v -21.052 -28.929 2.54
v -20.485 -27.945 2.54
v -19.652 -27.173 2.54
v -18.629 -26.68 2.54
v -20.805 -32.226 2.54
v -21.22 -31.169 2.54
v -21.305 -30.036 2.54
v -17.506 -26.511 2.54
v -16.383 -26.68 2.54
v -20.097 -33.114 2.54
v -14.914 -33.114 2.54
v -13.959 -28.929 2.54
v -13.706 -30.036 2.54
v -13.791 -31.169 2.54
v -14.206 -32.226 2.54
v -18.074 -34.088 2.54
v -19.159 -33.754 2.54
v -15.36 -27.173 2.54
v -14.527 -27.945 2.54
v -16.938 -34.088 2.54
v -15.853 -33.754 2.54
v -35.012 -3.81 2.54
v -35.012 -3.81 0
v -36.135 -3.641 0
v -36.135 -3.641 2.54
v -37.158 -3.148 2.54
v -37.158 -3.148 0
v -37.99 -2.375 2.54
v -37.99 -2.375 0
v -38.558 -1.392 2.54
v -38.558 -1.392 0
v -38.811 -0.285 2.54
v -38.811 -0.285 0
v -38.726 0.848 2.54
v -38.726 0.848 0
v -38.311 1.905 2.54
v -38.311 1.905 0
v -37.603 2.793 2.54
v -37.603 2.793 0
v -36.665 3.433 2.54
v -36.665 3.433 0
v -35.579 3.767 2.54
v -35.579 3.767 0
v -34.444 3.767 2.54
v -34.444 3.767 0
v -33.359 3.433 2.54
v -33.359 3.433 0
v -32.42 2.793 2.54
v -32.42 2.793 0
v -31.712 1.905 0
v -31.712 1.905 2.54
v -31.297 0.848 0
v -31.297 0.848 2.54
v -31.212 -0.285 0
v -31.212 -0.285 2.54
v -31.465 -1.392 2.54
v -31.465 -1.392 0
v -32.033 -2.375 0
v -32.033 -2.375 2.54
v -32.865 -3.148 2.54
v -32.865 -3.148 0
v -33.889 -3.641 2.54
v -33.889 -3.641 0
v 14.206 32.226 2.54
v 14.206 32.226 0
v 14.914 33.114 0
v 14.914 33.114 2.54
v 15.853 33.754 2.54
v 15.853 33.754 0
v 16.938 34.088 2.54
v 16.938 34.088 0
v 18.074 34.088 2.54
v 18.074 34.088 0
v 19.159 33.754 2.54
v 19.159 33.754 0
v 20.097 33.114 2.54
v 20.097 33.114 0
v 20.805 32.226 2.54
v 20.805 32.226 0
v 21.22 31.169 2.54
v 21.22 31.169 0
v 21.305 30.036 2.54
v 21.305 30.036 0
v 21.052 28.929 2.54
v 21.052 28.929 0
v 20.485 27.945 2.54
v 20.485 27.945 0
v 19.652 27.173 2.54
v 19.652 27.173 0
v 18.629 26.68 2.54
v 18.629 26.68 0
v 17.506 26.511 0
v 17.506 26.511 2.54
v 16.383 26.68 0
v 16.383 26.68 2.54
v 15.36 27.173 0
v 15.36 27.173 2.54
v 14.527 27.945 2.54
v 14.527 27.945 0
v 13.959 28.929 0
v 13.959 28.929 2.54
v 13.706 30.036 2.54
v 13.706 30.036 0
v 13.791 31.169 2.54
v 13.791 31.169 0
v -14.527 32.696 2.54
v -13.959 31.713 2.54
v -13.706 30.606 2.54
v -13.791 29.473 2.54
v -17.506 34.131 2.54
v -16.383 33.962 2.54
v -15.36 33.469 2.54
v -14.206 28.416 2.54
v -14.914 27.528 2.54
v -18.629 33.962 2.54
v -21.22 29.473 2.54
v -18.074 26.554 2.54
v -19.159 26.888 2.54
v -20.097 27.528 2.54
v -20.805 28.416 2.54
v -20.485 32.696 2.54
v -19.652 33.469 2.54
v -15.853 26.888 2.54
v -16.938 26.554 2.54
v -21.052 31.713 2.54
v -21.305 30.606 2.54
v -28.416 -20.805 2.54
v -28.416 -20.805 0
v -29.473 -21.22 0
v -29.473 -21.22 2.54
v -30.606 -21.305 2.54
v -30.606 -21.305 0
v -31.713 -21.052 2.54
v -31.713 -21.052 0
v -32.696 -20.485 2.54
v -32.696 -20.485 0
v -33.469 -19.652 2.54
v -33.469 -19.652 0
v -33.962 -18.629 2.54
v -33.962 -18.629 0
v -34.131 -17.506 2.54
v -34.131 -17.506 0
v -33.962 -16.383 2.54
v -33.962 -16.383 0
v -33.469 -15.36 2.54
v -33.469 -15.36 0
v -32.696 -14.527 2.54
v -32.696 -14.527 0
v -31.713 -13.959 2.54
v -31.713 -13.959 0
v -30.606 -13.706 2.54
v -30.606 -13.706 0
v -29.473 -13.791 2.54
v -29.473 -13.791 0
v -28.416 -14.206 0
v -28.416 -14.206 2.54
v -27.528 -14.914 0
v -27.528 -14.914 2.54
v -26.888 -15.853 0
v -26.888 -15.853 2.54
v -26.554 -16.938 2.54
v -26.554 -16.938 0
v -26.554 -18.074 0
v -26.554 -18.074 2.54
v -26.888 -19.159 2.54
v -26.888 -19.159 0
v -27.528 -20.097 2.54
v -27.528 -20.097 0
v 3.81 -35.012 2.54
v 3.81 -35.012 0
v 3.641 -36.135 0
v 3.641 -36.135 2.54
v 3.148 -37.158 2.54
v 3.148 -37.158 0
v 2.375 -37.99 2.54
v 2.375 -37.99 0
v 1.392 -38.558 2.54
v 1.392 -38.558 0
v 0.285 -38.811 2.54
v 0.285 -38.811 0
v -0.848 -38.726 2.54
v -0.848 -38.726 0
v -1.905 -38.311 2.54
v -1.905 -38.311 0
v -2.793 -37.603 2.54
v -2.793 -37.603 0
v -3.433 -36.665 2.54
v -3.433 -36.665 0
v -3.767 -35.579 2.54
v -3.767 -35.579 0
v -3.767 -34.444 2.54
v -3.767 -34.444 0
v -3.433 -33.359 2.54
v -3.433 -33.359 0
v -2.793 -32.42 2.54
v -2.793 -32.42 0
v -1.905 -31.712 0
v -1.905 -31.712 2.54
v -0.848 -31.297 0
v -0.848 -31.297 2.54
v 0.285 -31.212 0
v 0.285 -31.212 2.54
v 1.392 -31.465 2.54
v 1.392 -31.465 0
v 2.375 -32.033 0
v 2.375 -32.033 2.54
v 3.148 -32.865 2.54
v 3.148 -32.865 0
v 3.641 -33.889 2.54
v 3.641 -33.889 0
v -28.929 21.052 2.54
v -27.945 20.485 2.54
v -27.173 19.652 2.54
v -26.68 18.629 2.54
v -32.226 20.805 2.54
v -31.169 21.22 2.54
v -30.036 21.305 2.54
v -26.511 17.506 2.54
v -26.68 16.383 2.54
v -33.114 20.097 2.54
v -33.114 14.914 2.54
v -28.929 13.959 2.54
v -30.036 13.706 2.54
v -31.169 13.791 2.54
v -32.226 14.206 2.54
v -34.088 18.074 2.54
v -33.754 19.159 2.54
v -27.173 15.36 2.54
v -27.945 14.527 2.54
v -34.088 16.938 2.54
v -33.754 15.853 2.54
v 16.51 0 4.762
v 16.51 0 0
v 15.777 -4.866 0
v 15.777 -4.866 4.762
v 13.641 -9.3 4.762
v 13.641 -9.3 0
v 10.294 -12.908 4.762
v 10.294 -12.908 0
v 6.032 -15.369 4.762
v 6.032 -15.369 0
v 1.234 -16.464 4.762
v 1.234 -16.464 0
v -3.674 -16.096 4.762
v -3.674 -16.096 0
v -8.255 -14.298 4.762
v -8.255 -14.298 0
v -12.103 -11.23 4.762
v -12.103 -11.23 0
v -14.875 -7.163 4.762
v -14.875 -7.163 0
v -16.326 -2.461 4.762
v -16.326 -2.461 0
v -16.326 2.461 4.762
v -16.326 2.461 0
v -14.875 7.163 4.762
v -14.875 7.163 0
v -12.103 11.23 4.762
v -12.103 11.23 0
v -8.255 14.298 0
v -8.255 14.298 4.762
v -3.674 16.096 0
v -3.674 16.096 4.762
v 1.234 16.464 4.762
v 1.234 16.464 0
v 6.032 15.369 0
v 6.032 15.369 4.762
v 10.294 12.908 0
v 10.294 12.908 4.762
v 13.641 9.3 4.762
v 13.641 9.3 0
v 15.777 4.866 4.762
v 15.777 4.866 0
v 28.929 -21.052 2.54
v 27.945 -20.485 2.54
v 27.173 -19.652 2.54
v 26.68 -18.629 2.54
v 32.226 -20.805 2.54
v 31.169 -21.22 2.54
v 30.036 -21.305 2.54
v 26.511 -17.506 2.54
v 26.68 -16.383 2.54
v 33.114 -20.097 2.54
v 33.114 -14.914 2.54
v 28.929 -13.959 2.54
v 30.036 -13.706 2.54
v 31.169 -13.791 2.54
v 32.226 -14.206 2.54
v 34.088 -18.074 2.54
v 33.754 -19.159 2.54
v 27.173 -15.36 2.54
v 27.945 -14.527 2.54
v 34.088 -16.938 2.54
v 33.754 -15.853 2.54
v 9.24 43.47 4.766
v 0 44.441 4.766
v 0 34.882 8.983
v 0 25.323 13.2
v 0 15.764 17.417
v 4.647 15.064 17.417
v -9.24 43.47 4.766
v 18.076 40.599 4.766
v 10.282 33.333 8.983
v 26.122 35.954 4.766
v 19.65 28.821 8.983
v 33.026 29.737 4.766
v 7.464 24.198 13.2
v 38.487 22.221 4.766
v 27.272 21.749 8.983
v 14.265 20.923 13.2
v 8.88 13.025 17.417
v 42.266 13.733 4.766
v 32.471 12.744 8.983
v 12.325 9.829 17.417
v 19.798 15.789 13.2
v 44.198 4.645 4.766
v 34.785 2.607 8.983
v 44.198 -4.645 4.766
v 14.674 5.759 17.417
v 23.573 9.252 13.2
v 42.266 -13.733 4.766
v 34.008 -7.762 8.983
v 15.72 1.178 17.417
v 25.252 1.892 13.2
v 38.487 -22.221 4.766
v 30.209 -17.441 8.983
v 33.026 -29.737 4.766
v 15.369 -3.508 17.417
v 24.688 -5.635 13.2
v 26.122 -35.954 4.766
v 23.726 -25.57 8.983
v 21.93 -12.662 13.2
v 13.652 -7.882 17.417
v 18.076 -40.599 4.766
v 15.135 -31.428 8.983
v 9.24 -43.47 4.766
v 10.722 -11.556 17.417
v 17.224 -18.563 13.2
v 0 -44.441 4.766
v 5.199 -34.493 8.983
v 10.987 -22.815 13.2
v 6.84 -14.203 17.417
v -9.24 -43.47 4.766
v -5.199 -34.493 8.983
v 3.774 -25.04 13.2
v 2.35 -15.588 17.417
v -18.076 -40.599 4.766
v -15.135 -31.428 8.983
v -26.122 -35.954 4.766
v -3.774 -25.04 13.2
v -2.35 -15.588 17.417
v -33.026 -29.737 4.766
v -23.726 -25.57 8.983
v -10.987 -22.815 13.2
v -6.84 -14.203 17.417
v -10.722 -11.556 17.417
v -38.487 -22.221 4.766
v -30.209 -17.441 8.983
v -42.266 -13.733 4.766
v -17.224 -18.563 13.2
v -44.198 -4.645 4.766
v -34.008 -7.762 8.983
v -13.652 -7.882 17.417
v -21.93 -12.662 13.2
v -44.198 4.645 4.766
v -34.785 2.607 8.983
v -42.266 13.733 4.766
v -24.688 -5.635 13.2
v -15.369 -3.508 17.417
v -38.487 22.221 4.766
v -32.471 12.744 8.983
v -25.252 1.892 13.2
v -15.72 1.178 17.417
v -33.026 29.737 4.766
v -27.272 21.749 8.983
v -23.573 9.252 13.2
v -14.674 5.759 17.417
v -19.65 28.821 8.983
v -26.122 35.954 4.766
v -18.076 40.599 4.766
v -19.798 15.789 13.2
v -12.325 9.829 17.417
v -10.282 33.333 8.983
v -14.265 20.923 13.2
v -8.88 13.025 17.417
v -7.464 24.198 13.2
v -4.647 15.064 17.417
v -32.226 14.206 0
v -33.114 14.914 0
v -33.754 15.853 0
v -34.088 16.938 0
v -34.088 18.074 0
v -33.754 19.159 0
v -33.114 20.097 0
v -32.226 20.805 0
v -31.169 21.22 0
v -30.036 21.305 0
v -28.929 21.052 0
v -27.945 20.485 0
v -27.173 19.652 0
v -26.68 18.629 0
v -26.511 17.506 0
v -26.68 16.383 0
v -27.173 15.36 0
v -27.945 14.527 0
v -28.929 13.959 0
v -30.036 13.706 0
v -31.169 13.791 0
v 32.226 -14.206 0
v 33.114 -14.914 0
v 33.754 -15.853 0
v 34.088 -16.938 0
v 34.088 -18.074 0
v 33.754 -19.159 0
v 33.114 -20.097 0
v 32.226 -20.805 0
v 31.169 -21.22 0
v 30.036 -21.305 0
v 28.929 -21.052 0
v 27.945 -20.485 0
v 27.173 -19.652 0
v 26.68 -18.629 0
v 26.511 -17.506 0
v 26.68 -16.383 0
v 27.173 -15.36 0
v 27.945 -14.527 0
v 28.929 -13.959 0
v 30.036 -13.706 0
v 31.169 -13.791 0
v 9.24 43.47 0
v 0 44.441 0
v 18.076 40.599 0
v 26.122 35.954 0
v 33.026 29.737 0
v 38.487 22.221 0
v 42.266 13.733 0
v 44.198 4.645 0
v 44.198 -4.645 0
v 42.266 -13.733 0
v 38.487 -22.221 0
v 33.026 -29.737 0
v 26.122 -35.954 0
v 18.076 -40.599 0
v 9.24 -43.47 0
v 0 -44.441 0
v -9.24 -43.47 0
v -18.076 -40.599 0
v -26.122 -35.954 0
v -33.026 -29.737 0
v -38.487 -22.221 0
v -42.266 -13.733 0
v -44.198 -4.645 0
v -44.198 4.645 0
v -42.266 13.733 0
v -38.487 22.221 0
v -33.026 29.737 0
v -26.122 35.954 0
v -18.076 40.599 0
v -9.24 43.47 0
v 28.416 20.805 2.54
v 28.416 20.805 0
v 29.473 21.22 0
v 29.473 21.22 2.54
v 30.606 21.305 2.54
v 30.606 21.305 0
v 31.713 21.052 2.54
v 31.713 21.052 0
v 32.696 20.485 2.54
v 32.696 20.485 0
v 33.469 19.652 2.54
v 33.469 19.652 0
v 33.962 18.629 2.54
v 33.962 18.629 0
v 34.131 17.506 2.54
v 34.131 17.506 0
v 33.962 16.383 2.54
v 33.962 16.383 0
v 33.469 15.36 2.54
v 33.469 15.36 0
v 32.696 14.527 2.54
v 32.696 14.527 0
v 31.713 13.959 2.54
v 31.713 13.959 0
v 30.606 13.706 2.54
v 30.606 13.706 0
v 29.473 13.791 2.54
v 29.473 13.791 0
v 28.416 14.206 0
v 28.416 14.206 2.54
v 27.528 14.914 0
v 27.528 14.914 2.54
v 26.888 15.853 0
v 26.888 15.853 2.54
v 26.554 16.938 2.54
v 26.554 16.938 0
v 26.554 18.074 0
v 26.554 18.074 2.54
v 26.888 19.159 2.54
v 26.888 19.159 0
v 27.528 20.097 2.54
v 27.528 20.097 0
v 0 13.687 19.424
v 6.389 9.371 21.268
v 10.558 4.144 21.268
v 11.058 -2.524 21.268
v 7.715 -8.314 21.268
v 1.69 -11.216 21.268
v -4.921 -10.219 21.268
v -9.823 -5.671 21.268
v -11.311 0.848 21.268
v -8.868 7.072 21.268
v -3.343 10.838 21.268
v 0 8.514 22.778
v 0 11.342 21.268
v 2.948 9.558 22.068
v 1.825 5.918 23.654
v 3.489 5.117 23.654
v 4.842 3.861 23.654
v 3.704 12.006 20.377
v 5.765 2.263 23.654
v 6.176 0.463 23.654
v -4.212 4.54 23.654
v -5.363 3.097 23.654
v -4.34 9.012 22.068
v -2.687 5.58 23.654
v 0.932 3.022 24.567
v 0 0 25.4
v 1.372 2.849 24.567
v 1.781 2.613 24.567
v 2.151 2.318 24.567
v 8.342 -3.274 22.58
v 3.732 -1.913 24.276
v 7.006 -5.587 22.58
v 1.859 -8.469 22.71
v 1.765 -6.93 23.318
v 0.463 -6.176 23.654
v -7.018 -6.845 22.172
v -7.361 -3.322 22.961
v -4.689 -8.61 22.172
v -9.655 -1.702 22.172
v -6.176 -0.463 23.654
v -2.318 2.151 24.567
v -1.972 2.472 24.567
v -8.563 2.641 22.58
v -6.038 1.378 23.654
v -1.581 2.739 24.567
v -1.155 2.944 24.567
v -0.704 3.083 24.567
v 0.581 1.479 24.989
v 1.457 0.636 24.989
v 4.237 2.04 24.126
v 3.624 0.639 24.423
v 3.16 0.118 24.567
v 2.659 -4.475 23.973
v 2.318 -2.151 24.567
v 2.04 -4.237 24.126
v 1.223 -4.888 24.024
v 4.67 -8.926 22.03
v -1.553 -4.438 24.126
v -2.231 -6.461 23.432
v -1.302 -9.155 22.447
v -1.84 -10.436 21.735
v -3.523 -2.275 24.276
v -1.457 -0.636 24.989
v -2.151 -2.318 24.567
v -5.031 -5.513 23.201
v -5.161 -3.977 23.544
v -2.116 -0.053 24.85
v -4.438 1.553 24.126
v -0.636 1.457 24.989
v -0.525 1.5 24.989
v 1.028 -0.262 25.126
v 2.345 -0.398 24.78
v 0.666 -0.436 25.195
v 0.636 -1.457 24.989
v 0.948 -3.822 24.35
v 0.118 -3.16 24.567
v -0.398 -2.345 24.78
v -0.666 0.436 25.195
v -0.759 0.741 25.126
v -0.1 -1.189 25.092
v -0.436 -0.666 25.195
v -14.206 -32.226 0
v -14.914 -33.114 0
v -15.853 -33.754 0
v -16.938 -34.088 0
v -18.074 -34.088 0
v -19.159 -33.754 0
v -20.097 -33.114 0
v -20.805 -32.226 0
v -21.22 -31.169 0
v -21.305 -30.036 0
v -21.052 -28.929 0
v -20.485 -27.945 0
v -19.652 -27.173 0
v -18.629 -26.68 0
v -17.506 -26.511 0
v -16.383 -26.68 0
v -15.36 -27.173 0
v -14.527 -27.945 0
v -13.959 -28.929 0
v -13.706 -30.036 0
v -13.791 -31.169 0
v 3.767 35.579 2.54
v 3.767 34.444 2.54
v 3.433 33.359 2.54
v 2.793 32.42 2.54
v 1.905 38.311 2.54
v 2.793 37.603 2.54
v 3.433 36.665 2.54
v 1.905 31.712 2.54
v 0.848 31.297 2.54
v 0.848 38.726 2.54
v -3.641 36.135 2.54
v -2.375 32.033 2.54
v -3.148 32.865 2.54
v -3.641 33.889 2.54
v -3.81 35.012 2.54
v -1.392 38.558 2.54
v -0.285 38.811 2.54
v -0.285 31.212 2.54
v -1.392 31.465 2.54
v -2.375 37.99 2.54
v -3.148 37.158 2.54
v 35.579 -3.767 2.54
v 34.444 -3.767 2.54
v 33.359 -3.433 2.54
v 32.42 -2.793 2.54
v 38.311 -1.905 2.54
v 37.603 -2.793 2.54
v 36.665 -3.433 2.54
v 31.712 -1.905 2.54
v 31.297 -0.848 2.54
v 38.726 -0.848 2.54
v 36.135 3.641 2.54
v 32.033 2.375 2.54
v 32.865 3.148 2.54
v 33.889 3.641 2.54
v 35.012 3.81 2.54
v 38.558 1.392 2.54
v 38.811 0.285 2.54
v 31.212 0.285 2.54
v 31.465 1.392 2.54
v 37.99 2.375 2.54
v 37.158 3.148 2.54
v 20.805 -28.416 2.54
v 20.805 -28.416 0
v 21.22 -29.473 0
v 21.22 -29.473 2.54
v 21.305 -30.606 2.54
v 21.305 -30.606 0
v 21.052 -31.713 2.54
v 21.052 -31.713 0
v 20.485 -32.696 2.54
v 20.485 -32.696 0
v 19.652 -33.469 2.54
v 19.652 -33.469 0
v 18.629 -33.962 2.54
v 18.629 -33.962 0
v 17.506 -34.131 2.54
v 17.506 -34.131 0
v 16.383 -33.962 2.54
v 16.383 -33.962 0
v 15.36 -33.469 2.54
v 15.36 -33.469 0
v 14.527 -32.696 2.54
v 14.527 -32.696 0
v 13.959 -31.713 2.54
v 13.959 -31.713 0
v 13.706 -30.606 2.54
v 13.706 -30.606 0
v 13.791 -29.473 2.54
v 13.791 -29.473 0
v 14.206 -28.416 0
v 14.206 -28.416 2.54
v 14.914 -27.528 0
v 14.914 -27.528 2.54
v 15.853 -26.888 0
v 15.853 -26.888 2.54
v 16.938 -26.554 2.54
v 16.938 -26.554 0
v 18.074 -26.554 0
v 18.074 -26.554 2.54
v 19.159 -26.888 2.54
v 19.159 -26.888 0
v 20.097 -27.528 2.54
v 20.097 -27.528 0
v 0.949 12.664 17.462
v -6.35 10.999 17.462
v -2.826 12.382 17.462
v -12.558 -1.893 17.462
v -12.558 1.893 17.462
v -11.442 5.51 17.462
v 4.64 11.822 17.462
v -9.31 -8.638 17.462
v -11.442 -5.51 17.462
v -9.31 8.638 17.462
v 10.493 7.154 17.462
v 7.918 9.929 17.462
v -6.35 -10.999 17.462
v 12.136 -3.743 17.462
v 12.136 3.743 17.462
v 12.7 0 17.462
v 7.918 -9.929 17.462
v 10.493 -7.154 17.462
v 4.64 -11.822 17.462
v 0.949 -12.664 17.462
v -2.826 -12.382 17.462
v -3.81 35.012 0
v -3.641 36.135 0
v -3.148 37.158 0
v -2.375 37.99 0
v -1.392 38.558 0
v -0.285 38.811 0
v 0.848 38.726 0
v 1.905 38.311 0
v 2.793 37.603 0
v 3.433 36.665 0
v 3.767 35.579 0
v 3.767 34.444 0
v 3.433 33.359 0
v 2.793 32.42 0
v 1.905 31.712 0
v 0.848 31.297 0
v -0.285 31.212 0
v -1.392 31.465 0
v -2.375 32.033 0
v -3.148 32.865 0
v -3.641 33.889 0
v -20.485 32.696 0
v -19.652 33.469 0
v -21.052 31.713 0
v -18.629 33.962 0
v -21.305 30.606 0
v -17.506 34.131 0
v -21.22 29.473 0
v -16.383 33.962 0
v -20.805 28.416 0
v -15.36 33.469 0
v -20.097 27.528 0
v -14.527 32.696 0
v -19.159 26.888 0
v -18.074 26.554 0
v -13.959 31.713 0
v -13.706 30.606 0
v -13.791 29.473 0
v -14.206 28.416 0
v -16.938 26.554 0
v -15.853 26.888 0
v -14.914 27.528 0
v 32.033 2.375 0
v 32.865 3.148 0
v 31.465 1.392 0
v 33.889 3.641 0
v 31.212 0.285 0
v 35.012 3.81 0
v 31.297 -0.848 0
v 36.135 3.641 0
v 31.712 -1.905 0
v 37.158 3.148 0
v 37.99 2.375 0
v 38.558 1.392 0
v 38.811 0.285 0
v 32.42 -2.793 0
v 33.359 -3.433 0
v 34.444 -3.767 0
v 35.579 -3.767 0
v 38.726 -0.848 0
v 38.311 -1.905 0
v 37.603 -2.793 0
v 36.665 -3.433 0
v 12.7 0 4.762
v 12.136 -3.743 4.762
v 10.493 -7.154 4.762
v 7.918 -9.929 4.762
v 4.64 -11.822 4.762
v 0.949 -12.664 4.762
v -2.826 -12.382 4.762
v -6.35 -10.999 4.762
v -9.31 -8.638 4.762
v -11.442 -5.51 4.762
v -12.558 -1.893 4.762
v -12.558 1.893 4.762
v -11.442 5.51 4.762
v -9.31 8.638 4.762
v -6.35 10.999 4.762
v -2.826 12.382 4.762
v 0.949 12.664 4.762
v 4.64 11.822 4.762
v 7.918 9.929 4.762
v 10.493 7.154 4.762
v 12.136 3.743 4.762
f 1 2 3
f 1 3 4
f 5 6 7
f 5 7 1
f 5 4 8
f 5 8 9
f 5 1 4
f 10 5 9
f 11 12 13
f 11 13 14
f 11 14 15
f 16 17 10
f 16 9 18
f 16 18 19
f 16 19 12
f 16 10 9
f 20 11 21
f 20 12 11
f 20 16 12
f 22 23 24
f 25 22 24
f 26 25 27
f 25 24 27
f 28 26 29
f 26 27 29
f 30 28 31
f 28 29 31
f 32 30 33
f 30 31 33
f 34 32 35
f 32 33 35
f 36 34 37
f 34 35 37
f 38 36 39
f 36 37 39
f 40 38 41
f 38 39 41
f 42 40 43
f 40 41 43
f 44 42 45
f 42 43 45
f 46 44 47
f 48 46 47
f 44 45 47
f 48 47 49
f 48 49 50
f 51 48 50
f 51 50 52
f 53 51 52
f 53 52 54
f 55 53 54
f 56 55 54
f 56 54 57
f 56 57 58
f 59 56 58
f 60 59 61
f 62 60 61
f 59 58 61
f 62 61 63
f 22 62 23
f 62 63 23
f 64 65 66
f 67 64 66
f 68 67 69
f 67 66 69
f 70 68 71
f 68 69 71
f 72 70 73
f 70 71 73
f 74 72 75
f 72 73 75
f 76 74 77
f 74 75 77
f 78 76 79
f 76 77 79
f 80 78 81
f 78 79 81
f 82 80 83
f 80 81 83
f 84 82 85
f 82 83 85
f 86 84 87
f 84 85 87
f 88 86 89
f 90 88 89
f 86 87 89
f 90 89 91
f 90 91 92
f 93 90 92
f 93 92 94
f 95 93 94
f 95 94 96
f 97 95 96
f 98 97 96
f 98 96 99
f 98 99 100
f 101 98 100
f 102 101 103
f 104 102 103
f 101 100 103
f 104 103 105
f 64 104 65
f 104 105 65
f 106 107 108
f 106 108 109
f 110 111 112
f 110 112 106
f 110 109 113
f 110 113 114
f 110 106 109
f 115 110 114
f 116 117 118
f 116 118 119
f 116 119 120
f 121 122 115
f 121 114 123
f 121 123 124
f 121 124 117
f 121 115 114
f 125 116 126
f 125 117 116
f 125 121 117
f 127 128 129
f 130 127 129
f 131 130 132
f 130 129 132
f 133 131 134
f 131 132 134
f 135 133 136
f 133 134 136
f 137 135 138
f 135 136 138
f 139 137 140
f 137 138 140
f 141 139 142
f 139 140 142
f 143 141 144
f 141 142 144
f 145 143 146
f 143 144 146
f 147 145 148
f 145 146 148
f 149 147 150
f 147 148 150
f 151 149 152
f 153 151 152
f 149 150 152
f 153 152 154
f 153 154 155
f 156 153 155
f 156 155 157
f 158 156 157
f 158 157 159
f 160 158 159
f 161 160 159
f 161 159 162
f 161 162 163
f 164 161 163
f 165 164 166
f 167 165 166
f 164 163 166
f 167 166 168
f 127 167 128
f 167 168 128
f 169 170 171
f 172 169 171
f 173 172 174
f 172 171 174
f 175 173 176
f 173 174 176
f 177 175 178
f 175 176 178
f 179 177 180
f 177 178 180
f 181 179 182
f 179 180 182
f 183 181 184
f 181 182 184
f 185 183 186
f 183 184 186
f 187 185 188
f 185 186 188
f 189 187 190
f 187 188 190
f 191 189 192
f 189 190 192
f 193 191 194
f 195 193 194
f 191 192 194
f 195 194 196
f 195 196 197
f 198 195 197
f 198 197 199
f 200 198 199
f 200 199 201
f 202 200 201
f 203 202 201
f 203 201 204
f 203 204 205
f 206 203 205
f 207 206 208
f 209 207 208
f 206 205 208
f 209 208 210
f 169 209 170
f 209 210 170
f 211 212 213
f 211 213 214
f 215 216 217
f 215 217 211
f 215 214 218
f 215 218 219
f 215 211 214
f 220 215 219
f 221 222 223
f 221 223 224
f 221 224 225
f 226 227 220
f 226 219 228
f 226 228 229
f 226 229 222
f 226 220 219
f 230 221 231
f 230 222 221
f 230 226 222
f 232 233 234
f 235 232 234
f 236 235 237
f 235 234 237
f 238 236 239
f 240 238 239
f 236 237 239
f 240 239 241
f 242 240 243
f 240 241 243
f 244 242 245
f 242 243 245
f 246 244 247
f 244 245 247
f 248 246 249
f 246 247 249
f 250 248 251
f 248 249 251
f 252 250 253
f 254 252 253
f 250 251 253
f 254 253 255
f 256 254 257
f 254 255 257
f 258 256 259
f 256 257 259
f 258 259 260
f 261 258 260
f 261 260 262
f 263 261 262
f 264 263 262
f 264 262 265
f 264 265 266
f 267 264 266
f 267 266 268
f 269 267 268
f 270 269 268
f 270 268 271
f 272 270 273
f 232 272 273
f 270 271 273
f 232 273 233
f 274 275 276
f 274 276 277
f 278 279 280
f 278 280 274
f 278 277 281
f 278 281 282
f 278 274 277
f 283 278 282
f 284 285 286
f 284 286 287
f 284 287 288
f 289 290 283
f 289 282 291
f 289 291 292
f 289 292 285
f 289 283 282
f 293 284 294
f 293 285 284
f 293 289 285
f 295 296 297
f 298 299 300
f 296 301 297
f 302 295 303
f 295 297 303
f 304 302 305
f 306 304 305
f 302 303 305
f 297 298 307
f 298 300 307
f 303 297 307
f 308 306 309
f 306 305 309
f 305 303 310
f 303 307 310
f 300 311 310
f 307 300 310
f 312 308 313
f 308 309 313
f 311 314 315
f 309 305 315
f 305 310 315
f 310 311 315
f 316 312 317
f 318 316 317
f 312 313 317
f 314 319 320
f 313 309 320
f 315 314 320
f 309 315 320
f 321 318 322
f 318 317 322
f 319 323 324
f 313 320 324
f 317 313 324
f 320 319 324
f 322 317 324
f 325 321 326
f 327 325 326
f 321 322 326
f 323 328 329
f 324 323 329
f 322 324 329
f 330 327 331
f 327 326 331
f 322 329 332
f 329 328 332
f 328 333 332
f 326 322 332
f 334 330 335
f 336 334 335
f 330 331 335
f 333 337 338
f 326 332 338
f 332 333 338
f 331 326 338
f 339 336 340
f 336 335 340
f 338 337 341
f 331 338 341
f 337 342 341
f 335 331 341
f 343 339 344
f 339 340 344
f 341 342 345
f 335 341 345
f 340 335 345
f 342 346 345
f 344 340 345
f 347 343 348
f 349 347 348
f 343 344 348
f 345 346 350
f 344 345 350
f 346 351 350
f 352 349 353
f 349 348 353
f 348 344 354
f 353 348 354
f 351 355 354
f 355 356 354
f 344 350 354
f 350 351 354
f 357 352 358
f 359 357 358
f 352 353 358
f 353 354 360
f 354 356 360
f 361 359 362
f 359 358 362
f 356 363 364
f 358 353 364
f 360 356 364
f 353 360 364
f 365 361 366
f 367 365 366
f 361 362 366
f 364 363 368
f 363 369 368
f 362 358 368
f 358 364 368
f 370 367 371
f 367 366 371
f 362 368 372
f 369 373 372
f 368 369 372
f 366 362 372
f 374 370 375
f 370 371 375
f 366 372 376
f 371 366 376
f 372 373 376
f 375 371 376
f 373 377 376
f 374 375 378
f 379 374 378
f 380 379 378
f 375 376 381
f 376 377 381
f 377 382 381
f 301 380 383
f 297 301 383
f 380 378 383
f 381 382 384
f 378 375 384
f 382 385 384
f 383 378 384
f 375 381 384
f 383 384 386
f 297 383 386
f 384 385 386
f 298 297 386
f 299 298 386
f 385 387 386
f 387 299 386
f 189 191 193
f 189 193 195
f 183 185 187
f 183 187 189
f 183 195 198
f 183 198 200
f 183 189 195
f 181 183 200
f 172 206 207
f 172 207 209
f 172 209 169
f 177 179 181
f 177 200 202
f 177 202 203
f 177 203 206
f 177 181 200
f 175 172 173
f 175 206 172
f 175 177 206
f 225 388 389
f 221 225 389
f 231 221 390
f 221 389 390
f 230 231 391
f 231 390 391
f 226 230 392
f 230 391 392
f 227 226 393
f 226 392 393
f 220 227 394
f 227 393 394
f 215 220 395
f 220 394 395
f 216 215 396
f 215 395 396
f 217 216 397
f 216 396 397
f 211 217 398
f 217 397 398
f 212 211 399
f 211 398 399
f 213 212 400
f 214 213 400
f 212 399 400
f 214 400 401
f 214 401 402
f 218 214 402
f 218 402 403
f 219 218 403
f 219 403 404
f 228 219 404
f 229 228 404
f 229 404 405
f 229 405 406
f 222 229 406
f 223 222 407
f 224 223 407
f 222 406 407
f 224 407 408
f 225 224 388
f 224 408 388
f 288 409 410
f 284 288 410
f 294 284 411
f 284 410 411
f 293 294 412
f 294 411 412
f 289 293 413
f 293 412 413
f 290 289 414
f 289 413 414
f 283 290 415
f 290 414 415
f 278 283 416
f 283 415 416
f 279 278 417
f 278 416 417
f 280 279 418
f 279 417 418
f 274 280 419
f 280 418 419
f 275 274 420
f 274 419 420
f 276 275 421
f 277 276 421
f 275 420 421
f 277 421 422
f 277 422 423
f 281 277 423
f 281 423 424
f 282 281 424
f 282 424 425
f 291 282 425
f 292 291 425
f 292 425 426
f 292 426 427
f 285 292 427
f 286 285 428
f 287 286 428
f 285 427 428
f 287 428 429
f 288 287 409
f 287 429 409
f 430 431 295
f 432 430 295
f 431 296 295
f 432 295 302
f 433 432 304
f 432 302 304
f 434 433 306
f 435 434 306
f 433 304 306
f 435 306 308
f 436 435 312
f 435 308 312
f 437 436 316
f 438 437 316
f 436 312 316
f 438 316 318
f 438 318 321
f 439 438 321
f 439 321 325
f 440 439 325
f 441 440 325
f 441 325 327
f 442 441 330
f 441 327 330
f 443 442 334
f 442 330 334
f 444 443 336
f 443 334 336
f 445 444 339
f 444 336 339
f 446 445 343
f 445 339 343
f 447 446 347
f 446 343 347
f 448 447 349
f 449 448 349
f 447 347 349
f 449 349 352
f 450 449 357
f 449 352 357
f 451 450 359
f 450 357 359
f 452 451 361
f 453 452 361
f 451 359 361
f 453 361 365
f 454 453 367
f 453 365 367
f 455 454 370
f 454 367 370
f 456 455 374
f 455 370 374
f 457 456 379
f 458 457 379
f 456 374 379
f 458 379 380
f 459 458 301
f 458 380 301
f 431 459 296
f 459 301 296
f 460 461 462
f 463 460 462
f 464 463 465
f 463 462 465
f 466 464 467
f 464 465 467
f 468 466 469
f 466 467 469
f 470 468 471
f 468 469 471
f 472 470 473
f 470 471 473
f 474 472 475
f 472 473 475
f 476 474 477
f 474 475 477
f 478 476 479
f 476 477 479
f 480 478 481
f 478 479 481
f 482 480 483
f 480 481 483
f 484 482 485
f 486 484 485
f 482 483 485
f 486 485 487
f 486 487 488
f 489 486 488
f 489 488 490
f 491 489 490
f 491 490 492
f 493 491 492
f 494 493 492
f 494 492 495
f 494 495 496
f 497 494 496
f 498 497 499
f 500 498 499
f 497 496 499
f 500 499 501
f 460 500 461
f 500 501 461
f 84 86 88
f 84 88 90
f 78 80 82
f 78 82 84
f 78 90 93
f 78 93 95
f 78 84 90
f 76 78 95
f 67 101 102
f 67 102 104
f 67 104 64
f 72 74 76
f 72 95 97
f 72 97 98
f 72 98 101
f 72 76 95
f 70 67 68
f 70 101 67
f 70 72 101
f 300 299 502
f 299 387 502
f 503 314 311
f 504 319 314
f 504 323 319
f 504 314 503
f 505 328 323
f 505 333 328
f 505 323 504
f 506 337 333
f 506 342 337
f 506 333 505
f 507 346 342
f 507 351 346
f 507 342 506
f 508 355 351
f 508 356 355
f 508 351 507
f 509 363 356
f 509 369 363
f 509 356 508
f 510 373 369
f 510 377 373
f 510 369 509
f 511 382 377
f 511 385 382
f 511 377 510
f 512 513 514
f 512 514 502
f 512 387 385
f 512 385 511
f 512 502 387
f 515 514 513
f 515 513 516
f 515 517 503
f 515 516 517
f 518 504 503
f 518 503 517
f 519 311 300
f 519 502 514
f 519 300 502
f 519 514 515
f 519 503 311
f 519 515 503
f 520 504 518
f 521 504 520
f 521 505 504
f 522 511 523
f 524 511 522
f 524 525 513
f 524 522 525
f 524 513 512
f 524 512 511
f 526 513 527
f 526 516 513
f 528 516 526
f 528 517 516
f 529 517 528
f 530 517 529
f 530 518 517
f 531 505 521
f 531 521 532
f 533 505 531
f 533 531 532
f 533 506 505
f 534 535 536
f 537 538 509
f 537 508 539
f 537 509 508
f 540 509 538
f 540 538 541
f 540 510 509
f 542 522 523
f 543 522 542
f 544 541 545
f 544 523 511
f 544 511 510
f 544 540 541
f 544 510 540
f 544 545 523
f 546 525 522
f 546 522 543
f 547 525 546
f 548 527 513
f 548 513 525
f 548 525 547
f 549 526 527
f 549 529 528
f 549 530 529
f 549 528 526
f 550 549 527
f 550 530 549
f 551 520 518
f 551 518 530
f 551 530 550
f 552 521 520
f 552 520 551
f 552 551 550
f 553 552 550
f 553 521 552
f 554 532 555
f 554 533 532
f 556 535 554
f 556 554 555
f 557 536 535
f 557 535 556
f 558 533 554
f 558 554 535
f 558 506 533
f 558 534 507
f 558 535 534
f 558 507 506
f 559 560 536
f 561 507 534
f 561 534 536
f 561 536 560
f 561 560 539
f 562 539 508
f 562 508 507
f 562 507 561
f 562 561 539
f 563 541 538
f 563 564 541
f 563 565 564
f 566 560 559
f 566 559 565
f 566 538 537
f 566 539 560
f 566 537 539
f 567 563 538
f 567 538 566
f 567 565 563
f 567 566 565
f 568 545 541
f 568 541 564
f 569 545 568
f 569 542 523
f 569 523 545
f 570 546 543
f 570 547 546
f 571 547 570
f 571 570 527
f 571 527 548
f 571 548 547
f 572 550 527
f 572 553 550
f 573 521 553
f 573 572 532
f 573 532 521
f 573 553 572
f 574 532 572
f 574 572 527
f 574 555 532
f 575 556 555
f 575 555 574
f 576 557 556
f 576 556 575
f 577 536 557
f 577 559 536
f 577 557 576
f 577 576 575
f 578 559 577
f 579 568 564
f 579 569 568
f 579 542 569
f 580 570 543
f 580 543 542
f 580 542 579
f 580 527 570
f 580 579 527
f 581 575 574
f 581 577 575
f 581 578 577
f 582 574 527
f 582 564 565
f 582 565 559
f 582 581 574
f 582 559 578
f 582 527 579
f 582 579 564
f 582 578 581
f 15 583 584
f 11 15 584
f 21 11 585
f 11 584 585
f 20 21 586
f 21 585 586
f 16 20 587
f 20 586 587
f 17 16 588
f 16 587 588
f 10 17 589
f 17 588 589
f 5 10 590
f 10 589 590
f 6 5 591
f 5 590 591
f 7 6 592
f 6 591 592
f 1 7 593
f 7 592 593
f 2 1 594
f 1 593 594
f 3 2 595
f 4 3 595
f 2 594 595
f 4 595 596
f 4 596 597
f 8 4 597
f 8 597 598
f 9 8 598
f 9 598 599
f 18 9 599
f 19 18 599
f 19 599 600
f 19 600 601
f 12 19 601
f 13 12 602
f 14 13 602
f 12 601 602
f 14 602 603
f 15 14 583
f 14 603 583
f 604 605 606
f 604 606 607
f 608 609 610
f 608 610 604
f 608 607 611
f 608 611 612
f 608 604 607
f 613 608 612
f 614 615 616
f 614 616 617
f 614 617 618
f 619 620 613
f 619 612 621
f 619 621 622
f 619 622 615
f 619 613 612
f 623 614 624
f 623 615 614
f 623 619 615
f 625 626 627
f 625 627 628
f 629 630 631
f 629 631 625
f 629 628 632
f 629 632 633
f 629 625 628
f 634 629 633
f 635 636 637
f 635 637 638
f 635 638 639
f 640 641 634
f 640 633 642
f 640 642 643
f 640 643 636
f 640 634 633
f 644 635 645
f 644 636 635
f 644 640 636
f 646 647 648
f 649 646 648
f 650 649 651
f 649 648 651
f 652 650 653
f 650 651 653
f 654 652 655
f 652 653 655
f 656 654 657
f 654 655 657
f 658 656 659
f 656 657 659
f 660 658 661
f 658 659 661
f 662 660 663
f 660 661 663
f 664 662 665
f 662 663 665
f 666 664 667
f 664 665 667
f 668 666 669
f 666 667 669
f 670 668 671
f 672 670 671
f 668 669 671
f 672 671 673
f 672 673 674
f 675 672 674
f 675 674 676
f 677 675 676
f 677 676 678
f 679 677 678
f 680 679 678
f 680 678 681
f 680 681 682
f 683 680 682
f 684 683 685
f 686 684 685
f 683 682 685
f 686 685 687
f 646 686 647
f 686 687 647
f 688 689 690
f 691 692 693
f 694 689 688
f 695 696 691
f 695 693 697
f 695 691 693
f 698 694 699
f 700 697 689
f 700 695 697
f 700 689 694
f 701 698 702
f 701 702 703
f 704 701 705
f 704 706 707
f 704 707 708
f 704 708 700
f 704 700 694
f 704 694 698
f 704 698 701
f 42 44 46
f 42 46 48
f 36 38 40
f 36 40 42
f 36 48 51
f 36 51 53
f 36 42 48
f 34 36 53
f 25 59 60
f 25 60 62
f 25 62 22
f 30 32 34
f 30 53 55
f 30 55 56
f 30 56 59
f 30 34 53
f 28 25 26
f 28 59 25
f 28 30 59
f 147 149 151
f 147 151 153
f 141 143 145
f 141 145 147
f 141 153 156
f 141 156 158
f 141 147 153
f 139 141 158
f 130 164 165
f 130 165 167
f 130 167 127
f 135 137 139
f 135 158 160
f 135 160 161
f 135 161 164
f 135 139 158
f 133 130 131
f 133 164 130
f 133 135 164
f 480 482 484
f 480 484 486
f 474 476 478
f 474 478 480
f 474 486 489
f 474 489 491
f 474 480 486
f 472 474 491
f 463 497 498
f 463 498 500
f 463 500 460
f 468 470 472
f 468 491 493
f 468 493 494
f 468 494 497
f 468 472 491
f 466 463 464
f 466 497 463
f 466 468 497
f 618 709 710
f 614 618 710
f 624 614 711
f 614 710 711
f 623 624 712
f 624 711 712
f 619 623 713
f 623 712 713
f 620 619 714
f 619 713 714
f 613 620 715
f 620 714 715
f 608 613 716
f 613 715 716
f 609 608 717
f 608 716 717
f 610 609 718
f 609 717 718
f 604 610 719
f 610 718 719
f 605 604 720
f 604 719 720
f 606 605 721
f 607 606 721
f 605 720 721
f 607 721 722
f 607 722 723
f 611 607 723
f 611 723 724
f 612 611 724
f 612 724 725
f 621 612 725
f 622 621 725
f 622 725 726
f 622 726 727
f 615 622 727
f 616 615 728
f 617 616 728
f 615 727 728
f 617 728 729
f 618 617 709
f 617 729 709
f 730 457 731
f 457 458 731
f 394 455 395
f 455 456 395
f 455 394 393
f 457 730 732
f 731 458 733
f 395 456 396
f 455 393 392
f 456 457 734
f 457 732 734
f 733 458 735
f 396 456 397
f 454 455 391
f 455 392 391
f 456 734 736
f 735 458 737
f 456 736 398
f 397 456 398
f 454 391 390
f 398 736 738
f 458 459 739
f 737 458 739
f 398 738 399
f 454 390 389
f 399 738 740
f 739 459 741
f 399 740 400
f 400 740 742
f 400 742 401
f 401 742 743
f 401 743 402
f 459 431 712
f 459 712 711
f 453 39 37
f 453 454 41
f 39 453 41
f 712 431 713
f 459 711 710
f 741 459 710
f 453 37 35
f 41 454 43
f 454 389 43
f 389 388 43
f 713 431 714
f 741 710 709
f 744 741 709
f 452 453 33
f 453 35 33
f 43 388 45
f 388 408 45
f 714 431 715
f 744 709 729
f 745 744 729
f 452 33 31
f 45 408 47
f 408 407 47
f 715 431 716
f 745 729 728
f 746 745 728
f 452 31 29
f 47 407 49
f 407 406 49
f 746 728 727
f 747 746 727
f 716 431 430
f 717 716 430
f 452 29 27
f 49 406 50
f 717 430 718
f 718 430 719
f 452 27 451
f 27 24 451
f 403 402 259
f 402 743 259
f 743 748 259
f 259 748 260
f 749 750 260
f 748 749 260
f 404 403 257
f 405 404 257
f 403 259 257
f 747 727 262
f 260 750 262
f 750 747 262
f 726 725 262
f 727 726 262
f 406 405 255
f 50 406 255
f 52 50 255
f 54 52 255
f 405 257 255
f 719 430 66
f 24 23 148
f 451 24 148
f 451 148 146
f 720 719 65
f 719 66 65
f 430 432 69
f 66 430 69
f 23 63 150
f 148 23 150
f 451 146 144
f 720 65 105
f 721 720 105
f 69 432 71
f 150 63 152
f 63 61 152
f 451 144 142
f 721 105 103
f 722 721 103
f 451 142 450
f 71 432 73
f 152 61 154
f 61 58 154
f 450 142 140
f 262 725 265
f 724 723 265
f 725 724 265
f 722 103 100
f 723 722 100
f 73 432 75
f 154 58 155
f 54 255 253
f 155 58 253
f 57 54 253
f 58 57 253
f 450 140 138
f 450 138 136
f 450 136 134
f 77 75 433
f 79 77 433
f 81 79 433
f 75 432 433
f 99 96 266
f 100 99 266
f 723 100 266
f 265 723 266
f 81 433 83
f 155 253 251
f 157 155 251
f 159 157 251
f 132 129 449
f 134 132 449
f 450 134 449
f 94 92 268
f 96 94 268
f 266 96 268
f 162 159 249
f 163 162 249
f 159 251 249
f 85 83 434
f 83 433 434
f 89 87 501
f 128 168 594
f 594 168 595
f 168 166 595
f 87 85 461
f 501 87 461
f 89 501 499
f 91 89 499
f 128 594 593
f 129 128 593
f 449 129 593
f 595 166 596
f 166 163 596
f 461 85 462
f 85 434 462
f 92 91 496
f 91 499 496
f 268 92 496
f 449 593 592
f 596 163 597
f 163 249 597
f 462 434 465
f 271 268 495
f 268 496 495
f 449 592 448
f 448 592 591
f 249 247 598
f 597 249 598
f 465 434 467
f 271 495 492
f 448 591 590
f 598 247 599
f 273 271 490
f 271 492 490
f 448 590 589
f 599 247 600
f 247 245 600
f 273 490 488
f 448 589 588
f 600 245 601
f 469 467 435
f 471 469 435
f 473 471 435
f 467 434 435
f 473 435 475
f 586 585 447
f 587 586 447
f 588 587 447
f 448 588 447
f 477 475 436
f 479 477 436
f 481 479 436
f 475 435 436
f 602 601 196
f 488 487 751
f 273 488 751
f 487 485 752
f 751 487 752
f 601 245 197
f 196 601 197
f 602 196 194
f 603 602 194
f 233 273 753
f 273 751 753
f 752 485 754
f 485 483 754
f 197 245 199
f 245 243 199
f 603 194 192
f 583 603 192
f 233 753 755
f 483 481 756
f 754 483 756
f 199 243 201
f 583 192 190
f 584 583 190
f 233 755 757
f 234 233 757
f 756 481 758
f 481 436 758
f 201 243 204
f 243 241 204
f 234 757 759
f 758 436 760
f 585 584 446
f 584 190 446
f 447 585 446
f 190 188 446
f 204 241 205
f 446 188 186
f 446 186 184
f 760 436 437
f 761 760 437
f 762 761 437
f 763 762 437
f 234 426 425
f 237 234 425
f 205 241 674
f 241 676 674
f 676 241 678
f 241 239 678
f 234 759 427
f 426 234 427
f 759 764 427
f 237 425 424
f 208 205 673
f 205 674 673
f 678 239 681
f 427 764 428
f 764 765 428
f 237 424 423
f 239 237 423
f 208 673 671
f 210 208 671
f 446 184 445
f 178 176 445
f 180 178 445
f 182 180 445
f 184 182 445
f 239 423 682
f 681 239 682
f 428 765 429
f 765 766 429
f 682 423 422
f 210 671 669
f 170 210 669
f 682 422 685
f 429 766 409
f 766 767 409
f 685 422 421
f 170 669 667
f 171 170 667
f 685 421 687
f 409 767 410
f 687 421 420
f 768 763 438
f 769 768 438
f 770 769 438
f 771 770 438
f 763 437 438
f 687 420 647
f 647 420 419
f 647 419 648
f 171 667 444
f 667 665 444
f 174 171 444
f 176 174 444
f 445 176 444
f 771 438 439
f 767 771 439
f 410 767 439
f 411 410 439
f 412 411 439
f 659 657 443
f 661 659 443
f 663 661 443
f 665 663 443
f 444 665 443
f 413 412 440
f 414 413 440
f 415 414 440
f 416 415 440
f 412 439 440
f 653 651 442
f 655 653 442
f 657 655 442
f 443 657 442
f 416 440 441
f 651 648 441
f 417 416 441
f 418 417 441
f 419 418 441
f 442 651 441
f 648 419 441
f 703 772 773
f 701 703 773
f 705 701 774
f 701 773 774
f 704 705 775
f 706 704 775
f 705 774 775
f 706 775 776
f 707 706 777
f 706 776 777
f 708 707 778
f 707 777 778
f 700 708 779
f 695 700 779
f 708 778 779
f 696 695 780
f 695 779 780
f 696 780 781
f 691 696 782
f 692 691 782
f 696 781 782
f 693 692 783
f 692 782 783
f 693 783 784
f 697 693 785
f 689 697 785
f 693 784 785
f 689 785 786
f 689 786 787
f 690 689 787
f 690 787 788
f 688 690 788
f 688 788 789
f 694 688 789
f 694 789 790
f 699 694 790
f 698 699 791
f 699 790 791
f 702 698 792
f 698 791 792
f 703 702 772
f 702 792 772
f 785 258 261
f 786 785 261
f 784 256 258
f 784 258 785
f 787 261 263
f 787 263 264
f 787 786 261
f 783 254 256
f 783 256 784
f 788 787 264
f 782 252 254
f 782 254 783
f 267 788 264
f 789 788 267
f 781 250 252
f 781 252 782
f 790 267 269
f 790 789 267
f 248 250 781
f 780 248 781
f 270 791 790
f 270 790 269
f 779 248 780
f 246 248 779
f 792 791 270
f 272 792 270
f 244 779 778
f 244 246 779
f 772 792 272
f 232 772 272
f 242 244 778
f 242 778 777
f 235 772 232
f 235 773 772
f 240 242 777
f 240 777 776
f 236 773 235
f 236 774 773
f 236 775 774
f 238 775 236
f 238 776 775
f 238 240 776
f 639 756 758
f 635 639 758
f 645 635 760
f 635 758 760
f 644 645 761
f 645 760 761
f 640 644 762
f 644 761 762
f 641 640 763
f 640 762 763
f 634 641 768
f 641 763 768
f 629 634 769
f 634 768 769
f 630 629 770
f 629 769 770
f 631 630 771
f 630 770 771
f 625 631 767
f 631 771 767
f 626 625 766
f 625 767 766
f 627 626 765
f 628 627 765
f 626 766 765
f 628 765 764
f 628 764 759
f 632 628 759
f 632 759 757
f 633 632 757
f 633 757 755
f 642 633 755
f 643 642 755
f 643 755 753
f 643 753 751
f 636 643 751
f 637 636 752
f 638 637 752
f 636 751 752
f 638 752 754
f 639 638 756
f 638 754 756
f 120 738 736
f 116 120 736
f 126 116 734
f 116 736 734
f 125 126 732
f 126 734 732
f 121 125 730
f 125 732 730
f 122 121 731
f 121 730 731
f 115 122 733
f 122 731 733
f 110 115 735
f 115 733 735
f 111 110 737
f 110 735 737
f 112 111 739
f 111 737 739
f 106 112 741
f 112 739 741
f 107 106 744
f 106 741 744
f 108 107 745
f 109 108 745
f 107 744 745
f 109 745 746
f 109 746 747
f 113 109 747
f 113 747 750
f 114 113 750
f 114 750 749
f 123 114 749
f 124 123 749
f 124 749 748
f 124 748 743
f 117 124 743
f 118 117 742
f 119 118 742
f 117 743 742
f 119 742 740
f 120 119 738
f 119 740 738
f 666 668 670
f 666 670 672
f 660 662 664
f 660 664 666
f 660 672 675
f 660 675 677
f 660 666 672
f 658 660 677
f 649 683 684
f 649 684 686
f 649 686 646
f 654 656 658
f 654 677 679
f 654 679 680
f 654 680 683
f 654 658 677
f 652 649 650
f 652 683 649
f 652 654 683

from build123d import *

# Parameters (mm, degrees)
F2_R            = 16.51
F3_DEPTH        = 4.7625
F4_R            = 12.7
F5_DEPTH        = 12.7
F6_R            = 3.81
F7_DEPTH        = 2.54
F7_COPIES_COUNT = 12


# Not quite as in the source:
# - a pattern or mirror of a feature is missing from the dataset's text; its kind, count and spacing are read off the source's solid


with BuildPart() as f1:
    # F0 (on Right) → F1 (revolve)
    with BuildSketch(Plane.YZ):
        with BuildLine():
            Line((0, 25.4), (0, 0))
            Line((0, 0), (44.4412930132, 0))
            Line((44.4412930132, 0), (44.4412930132, 4.7663409987))
            Line((44.4412930132, 4.7663409987), (15.7640874386, 17.416998744))
            add(Edge.make_bspline(
                [(0, 25.4), (3.7261787695, 24.441300081), (10.4835897095, 22.7027014465), (14.128884846, 19.0538131517), (15.7640874386, 17.416998744)],
                knots=[0, 0, 0, 0, 0.5514210698, 1, 1, 1, 1], degree=3))
        make_face()
    revolve(axis=Axis((0, 0, 12.7), (0, 0, -1)))

    # F2 (on face) → F3 (cut)
    with BuildSketch(Plane(origin=(0, 0, 0), x_dir=(1, 0, 0), z_dir=(0, 0, -1))):
        Circle(F2_R)
    extrude(amount=-F3_DEPTH, mode=Mode.SUBTRACT)

    # F4 (on face) → F5 (cut)
    with BuildSketch(Plane(origin=(0, 0, 4.7625), x_dir=(1, 0, 0), z_dir=(0, 0, -1))):
        Circle(F4_R)
    extrude(amount=-F5_DEPTH, mode=Mode.SUBTRACT)

    # F6 (on face) → F7 (cut)
    with BuildSketch(Plane(origin=(0, 0, 0), x_dir=(1, 0, 0), z_dir=(0, 0, -1))):
        with Locations((0, 35.0116197045)):
            Circle(F6_R)
    f7 = extrude(amount=-F7_DEPTH, mode=Mode.SUBTRACT)

    # F7_copies: F7 ×12 about axis
    f7_copies_axis = Axis((0, 0, 0), (0, 0, 1))
    for i in range(1, F7_COPIES_COUNT):
        add(f7.rotate(f7_copies_axis, i * 360 / F7_COPIES_COUNT), mode=Mode.SUBTRACT)


solid = f1.part
